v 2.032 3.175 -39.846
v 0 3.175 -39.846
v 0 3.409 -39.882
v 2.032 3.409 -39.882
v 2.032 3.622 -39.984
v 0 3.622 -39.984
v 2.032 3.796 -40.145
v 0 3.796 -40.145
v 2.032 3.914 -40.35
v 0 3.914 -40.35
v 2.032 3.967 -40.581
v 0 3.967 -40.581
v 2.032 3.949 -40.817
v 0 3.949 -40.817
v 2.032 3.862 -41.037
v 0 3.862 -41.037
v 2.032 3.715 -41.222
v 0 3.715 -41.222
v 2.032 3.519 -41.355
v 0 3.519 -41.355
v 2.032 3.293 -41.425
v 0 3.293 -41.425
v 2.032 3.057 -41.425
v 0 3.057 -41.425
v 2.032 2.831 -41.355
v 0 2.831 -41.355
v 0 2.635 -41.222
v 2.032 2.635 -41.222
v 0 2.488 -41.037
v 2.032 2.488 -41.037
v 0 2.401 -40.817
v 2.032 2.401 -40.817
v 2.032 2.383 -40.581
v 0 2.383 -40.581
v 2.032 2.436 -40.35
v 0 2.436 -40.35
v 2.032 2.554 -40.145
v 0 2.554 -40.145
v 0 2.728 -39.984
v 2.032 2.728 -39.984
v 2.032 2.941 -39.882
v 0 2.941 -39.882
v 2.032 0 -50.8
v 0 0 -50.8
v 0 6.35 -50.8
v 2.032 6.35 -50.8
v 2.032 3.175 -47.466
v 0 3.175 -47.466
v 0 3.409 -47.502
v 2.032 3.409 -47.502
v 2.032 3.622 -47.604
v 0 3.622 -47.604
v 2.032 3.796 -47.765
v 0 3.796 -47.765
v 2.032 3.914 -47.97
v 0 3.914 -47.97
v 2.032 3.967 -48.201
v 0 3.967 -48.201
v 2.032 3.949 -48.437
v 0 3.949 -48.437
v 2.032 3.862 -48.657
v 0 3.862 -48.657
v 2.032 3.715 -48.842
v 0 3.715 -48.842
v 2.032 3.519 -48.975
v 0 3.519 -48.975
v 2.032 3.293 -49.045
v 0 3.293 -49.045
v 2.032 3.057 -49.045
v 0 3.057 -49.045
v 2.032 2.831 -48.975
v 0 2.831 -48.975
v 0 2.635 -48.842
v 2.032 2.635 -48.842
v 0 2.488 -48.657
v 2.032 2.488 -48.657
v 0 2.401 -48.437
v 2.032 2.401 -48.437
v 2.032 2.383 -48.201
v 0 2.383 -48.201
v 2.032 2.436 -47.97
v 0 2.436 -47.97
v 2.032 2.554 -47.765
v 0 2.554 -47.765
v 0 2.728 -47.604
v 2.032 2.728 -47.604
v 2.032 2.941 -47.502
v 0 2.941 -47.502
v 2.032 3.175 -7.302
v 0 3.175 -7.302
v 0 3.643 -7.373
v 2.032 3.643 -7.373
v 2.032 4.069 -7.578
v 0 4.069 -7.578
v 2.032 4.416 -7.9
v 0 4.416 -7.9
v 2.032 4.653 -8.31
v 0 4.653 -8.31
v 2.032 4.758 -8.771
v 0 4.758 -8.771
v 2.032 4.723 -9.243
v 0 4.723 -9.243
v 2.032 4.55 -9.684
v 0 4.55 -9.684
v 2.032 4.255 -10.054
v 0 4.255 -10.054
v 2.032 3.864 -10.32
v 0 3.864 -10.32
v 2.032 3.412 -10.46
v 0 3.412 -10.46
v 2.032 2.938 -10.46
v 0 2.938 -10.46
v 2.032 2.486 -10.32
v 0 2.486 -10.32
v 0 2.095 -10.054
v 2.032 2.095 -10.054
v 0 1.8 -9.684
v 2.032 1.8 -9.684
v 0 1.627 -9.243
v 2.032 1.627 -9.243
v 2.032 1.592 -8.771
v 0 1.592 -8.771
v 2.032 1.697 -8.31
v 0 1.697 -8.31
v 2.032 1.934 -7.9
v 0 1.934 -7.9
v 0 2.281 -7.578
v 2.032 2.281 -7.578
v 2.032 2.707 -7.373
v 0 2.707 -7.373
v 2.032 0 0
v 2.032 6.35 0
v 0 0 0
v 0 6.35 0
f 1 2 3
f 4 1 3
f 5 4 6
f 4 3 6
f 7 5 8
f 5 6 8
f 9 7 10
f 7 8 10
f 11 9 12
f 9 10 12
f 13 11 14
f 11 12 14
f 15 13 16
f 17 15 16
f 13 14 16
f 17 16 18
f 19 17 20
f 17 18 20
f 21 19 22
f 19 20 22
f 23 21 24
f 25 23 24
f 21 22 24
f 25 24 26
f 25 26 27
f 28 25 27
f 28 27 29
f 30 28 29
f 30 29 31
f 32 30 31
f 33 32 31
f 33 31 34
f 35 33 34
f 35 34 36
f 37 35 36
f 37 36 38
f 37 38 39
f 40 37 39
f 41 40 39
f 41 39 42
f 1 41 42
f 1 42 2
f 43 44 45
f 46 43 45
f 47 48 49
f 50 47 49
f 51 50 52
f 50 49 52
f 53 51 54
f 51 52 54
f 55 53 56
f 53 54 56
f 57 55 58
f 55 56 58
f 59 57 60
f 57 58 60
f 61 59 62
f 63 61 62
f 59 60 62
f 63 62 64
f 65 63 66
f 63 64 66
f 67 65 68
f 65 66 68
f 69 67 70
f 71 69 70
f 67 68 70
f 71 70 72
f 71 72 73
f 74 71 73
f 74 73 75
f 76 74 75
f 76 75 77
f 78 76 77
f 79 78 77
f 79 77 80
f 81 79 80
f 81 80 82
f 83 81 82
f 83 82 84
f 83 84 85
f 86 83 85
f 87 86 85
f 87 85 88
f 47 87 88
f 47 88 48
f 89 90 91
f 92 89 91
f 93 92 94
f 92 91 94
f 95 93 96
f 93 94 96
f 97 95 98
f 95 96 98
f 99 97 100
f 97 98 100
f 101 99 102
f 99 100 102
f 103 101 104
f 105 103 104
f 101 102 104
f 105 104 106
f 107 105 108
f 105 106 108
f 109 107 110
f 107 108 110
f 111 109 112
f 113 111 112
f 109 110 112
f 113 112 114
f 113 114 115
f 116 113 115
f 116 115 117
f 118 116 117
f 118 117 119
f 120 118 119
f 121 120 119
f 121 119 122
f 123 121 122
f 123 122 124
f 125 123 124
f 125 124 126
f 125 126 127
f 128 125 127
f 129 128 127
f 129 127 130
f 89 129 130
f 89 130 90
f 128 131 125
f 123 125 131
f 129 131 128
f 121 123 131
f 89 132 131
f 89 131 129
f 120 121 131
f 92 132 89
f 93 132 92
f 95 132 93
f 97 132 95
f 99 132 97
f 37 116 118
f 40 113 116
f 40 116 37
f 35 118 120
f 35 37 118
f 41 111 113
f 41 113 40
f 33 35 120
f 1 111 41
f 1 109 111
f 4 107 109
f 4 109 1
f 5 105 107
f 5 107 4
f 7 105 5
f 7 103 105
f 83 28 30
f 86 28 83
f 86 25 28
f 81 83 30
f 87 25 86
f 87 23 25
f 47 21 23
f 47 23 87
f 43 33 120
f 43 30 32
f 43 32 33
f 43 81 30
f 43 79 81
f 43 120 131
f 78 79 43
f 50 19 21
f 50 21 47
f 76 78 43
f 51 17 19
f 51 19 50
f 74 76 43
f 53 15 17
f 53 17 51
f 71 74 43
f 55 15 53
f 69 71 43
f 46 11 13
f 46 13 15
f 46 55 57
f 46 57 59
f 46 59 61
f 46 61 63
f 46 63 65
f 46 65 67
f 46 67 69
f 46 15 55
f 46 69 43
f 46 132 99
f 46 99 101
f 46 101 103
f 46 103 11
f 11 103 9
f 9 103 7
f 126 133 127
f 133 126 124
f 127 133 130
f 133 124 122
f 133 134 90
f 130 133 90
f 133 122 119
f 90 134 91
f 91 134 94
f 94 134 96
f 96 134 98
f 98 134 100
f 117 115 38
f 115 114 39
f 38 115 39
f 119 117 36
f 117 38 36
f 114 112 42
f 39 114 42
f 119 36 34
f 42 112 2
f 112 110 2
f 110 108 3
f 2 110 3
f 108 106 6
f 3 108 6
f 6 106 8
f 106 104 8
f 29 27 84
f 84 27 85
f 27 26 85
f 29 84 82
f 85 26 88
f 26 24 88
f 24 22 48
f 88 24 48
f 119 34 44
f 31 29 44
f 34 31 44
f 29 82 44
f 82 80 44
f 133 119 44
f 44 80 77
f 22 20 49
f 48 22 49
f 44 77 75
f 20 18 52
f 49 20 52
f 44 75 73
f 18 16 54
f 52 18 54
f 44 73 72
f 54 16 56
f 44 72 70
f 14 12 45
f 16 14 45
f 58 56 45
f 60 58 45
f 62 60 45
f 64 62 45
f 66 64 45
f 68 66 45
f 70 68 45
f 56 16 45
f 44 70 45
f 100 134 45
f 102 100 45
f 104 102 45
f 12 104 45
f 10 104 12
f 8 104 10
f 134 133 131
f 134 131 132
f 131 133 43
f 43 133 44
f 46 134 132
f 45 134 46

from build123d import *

# Parameters (mm, degrees)
SKETCH1_W                          = 50.8
SKETCH1_H                          = 6.35
BOSS_EXTRUDE1_DEPTH                = 2.032
F_1_16_0_0625_DIAMETER_HOLE1_D     = 1.5875
F_1_16_0_0625_DIAMETER_HOLE1_DEPTH = 70.104
F_1_16_0_0625_DIAMETER_HOLE1_TIP   = 0.476933116
F_1_8_0_125_DIAMETER_HOLE1_D       = 3.175
F_1_8_0_125_DIAMETER_HOLE1_DEPTH   = 70.104
F_1_8_0_125_DIAMETER_HOLE1_TIP     = 0.953866233


with BuildPart() as part:
    # Sketch1 → Boss-Extrude1 (new body)
    with BuildSketch(Plane(origin=(0, 0, 0), x_dir=(0, 0, -1), z_dir=(1, 0, 0))):
        with Locations((25.4, 3.175)):
            Rectangle(SKETCH1_W, SKETCH1_H)
    extrude(amount=BOSS_EXTRUDE1_DEPTH)

    # 1/16 (0.0625) Diameter Hole1
    with Locations(Plane(origin=(2.032, 0, 0), x_dir=(0, 0, -1), z_dir=(1, 0, 0))):
        with Locations((40.64, 3.175), (48.26, 3.175)):
            Hole(F_1_16_0_0625_DIAMETER_HOLE1_D / 2, depth=F_1_16_0_0625_DIAMETER_HOLE1_DEPTH)
            with Locations((0, 0, -(F_1_16_0_0625_DIAMETER_HOLE1_DEPTH + F_1_16_0_0625_DIAMETER_HOLE1_TIP / 2))):  # 118° drill point
                Cone(0, F_1_16_0_0625_DIAMETER_HOLE1_D / 2, F_1_16_0_0625_DIAMETER_HOLE1_TIP, mode=Mode.SUBTRACT)

    # 1/8 (0.125) Diameter Hole1
    with Locations(Plane(origin=(2.032, 0, 0), x_dir=(0, 0, -1), z_dir=(1, 0, 0))):
        with Locations((8.89, 3.175)):
            Hole(F_1_8_0_125_DIAMETER_HOLE1_D / 2, depth=F_1_8_0_125_DIAMETER_HOLE1_DEPTH)
            with Locations((0, 0, -(F_1_8_0_125_DIAMETER_HOLE1_DEPTH + F_1_8_0_125_DIAMETER_HOLE1_TIP / 2))):  # 118° drill point
                Cone(0, F_1_8_0_125_DIAMETER_HOLE1_D / 2, F_1_8_0_125_DIAMETER_HOLE1_TIP, mode=Mode.SUBTRACT)


solid = part.part
